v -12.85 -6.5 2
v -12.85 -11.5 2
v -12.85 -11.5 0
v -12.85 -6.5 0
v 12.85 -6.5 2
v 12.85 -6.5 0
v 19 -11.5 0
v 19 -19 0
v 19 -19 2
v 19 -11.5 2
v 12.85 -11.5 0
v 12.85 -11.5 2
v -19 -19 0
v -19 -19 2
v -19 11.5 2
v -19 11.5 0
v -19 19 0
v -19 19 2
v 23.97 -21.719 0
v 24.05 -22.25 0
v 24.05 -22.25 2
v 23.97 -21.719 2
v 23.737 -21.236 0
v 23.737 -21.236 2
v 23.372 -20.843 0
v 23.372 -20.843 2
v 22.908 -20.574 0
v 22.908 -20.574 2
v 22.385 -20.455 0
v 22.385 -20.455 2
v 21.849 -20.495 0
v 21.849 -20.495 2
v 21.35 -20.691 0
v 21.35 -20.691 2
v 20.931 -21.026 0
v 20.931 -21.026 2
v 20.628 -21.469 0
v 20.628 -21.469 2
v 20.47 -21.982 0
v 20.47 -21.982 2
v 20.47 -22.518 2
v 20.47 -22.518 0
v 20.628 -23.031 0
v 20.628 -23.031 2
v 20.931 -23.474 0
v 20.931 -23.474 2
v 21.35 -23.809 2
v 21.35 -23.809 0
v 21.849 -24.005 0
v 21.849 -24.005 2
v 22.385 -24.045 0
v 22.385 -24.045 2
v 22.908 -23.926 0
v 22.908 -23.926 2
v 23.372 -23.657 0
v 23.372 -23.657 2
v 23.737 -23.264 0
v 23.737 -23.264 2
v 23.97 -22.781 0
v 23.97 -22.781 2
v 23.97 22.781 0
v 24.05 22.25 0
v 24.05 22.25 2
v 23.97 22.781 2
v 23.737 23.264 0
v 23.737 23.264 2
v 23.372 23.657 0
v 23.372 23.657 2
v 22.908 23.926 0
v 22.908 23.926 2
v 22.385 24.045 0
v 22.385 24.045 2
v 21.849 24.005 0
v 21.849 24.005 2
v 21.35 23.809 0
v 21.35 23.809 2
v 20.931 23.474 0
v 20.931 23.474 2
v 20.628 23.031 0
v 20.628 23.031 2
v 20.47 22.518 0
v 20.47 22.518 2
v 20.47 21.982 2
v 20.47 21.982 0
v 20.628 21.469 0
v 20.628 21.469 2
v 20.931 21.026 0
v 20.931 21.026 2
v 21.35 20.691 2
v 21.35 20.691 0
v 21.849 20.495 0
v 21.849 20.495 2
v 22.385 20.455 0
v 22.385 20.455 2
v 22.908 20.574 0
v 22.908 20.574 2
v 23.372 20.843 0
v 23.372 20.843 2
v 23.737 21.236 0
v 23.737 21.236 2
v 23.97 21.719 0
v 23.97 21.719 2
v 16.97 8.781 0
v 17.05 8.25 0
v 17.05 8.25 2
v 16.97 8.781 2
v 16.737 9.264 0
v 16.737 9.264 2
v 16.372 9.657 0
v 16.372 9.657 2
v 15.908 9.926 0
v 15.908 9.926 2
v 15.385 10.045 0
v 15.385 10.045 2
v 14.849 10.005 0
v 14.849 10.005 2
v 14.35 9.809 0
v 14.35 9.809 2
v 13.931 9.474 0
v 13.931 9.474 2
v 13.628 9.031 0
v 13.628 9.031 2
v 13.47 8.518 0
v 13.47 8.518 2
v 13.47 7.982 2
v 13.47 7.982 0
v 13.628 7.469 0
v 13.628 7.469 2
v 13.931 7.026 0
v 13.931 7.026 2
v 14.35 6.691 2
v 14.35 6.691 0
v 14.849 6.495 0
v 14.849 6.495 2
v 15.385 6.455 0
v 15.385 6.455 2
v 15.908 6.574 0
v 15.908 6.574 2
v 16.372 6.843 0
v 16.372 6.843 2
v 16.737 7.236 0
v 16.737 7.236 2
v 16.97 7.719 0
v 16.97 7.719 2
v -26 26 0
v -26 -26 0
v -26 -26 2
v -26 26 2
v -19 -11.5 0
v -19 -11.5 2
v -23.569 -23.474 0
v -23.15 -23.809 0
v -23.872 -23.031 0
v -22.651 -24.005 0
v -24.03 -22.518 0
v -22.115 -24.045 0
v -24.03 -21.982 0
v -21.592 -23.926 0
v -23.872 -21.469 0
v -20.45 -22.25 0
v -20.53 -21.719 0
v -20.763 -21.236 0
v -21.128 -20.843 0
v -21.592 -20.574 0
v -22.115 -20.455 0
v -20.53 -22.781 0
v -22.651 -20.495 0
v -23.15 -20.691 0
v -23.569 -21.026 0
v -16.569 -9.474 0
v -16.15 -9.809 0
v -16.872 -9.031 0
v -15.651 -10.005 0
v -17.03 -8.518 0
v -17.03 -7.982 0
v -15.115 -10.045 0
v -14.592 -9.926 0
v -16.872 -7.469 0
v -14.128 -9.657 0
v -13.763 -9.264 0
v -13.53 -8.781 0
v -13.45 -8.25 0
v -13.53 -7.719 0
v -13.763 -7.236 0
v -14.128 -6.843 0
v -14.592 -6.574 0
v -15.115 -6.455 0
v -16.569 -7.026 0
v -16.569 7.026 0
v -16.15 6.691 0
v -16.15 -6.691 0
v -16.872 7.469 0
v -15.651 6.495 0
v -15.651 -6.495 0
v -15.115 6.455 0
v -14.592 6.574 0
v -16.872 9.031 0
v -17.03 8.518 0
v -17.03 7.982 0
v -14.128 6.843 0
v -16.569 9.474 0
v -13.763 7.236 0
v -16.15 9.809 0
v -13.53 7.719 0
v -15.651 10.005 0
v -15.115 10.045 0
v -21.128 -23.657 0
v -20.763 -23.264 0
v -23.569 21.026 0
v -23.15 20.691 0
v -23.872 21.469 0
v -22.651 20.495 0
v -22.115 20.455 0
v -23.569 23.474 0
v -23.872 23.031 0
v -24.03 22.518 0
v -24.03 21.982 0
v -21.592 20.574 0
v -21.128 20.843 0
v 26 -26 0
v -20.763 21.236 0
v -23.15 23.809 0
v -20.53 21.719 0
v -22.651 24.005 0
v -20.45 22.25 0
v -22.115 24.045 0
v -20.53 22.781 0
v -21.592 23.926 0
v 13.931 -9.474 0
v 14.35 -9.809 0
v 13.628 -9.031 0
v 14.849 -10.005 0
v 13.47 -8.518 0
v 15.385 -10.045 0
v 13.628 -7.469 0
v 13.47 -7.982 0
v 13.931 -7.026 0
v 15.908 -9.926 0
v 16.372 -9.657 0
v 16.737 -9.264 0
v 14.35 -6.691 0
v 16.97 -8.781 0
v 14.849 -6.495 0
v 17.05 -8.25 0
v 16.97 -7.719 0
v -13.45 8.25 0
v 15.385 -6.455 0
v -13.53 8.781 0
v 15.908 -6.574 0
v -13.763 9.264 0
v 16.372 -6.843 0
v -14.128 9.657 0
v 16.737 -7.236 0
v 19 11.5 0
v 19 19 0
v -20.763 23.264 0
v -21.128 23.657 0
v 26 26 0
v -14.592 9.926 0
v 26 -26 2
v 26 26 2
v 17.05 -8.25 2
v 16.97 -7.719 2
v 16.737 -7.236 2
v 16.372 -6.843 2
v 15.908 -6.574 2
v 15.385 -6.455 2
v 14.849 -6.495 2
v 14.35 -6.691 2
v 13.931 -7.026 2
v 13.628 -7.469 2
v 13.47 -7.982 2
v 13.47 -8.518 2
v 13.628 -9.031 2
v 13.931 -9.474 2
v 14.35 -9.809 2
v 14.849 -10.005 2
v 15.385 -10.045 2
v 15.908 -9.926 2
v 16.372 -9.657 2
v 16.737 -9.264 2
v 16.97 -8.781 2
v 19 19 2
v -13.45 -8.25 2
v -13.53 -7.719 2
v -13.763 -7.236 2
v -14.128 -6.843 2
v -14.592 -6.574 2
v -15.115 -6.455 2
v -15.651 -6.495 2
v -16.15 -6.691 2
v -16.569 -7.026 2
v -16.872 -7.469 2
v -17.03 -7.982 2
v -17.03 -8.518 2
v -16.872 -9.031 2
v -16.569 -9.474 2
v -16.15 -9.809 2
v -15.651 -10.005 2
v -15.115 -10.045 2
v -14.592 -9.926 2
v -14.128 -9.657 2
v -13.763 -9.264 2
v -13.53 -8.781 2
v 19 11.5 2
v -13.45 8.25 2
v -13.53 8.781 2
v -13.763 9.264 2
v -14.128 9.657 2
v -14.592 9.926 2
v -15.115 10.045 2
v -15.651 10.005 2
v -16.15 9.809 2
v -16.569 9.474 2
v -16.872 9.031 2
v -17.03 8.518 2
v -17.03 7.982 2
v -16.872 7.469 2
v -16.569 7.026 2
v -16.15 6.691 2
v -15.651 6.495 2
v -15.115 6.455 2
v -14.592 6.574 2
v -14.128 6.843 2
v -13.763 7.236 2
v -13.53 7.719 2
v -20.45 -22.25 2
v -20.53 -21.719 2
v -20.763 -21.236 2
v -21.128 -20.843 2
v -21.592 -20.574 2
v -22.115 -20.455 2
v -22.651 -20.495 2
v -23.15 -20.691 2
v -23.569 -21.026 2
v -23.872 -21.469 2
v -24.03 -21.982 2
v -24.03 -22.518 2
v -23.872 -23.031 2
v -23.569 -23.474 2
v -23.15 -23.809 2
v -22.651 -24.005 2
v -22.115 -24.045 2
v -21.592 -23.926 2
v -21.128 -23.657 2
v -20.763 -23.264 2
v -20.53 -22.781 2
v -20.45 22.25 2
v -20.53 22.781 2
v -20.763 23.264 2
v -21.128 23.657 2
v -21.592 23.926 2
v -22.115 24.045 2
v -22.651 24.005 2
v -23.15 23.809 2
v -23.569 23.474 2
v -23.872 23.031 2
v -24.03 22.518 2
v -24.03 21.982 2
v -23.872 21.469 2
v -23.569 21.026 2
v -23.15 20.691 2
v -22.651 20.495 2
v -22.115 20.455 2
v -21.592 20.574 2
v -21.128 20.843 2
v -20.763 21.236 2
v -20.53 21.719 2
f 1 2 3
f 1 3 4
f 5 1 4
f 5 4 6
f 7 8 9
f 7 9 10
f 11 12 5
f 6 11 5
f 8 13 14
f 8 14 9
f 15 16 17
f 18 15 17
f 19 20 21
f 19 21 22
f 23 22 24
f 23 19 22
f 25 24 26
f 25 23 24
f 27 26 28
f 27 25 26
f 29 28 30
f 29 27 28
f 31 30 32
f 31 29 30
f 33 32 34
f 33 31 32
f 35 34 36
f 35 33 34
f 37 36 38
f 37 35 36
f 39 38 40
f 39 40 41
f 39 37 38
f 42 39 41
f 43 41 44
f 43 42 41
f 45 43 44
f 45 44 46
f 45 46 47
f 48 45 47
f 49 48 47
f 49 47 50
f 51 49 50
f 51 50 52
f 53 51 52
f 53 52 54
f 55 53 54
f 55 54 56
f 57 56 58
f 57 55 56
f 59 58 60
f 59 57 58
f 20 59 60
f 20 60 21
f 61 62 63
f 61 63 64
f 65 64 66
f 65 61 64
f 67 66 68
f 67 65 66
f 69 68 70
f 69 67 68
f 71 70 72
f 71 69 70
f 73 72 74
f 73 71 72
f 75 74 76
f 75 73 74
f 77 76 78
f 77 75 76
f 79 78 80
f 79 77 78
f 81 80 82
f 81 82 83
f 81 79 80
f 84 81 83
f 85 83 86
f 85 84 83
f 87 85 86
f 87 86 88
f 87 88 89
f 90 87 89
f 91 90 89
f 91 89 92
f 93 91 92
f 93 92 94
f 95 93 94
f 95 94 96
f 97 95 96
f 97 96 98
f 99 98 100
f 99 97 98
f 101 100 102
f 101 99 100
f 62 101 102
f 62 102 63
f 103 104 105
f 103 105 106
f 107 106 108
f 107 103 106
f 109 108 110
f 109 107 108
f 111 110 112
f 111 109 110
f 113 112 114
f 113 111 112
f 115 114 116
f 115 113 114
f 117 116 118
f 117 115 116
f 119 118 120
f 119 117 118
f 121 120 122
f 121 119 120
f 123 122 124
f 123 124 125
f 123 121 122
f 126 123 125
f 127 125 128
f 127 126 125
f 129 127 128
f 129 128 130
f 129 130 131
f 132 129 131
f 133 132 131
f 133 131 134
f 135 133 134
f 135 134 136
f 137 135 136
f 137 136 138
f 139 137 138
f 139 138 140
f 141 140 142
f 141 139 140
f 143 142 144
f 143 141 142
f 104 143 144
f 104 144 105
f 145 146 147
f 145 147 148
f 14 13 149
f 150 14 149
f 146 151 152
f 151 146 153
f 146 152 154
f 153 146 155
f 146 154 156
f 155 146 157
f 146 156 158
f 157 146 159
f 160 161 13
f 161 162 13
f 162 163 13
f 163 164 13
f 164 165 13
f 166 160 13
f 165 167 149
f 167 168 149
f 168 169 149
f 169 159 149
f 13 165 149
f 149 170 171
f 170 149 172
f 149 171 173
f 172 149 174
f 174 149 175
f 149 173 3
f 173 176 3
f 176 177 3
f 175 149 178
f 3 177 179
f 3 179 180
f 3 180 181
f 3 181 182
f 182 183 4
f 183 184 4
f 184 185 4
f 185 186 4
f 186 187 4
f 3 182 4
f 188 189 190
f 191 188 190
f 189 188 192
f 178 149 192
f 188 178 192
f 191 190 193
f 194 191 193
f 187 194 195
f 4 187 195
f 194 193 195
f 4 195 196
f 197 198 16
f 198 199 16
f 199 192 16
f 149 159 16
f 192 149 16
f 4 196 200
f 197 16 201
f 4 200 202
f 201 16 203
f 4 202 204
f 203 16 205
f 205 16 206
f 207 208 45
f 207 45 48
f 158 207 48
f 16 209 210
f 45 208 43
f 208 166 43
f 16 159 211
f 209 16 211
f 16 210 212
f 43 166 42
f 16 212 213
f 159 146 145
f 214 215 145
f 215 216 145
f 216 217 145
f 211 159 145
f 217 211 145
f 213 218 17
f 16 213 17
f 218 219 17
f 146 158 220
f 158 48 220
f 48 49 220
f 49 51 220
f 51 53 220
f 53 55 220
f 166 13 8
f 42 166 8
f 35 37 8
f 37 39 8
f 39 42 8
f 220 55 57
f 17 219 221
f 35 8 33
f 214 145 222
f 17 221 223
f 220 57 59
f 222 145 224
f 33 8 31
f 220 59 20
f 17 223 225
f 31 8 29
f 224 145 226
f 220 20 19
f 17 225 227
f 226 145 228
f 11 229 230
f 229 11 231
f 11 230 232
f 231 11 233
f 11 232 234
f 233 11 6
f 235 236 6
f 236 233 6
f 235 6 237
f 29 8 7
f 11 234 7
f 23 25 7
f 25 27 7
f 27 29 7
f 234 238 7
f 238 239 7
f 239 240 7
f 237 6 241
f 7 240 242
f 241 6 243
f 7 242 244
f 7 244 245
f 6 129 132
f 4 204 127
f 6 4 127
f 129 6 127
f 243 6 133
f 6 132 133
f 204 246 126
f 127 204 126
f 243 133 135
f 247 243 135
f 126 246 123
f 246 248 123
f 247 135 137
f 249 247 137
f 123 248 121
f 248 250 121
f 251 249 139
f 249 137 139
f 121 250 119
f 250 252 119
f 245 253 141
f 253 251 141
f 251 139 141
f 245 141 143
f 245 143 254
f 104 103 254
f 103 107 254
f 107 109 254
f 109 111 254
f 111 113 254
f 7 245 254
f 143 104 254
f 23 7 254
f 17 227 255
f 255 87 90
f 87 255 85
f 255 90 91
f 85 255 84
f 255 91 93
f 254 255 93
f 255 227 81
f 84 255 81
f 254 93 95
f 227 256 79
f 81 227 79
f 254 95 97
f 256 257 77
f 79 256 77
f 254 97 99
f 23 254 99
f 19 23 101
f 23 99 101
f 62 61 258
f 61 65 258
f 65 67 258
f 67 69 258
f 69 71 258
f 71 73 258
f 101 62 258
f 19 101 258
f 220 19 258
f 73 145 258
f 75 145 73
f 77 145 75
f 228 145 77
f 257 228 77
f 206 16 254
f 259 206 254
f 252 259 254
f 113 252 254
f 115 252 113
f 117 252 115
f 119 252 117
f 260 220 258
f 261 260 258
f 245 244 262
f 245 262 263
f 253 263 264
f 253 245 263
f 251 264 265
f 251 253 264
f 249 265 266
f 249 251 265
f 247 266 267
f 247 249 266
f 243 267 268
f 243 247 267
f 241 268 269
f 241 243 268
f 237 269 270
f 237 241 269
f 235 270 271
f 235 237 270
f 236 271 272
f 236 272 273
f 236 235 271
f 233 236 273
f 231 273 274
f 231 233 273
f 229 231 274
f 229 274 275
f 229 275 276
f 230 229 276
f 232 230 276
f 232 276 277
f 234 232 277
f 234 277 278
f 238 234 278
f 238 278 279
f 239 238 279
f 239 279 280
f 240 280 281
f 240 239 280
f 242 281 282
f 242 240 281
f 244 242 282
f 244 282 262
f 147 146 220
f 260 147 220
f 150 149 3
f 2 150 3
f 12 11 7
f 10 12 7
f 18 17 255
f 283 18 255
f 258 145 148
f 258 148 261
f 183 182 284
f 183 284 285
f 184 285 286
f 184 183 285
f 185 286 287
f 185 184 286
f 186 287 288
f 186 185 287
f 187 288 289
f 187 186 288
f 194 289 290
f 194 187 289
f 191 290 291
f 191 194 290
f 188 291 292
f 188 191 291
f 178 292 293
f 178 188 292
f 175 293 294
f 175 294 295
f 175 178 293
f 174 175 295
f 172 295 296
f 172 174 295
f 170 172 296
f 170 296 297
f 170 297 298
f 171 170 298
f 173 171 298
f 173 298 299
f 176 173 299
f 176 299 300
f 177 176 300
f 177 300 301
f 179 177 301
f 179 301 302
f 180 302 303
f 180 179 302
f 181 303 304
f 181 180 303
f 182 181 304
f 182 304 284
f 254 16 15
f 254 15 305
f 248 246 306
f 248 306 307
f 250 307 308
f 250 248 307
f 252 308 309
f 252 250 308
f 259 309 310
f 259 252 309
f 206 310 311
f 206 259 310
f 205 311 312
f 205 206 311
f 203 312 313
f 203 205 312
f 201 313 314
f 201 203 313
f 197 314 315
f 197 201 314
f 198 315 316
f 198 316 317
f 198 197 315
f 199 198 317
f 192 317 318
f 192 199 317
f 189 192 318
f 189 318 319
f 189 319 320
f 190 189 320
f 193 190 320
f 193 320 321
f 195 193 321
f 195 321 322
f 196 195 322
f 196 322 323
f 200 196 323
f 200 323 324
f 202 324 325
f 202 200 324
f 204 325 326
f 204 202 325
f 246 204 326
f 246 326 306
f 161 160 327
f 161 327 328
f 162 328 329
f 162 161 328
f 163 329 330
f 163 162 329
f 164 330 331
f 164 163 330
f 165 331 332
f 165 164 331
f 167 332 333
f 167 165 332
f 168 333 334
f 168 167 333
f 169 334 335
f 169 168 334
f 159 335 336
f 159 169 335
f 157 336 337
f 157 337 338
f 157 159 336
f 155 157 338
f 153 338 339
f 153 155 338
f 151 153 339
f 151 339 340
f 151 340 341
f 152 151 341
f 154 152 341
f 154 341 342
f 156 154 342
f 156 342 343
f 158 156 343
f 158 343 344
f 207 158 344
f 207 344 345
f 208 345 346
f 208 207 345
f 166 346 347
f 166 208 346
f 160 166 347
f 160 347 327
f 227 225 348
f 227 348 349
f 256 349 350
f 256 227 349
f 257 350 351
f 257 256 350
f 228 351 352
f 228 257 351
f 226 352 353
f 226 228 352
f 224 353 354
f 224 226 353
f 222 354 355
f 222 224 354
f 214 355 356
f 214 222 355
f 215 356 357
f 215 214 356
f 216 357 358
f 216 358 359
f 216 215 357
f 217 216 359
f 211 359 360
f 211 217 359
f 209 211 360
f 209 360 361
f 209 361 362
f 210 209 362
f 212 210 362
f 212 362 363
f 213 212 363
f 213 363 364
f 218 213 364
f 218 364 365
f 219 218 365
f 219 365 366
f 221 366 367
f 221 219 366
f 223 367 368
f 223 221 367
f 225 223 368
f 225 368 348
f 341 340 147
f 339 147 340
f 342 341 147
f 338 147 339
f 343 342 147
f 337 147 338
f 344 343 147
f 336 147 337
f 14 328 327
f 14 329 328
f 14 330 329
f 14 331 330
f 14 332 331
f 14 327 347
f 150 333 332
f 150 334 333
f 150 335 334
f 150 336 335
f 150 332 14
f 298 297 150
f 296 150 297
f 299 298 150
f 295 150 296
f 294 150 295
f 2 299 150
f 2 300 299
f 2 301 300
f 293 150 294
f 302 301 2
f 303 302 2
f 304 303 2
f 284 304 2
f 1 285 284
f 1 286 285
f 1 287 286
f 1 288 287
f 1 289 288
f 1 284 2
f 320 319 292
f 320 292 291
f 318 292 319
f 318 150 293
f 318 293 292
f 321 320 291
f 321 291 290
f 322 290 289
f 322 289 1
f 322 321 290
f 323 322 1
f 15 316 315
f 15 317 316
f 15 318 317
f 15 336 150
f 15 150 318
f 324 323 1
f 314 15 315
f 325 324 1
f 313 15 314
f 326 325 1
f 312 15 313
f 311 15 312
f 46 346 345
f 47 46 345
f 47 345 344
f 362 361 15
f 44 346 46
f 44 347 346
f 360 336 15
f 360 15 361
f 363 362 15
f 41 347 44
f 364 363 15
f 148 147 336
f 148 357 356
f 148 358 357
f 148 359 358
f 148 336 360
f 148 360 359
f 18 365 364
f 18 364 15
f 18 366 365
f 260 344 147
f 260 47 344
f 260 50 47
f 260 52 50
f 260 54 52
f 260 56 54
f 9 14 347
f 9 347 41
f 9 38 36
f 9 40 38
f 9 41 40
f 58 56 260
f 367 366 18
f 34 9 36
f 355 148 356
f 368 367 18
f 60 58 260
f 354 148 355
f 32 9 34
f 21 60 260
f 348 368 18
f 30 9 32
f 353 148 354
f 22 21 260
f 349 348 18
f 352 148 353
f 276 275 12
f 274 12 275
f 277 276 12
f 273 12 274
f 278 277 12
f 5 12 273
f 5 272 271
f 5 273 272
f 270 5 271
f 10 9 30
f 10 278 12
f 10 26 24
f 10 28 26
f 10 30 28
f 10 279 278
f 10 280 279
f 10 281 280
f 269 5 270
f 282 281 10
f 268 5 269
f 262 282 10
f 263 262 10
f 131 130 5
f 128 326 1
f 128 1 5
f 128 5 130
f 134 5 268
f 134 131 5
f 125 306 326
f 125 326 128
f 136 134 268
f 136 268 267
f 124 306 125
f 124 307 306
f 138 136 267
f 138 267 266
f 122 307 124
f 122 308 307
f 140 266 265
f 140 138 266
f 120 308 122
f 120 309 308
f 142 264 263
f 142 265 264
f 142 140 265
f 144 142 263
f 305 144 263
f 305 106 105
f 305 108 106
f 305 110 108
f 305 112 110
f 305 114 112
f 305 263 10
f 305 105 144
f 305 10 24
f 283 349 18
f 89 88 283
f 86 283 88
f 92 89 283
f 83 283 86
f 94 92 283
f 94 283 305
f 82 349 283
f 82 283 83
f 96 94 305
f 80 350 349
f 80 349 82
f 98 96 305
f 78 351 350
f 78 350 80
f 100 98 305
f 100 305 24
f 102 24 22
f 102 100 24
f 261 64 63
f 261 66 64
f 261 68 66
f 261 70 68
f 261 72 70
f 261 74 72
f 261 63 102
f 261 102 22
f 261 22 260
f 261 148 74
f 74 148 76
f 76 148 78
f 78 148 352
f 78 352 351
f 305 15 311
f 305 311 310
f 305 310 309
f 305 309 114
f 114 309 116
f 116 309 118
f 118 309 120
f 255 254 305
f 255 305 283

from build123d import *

# Parameters (mm, degrees)
SKETCH_W     = 52
SKETCH_H     = 52
SKETCH_R     = 1.8
SKETCH_W_2   = 38
SKETCH_H_2   = 7.5
PAD_DEPTH    = 2
SKETCH001_W  = 25.7
SKETCH001_H  = 8
POCKET_DEPTH = 5


with BuildPart() as part:
    # Sketch → Pad (new body)
    with BuildSketch(Plane.XY):
        Rectangle(SKETCH_W, SKETCH_H)
        with Locations((22.25, 22.25)):
            Circle(SKETCH_R, mode=Mode.SUBTRACT)
        with Locations((22.25, -22.25)):
            Circle(SKETCH_R, mode=Mode.SUBTRACT)
        with Locations((-22.25, 22.25)):
            Circle(SKETCH_R, mode=Mode.SUBTRACT)
        with Locations((-22.25, -22.25)):
            Circle(SKETCH_R, mode=Mode.SUBTRACT)
        with Locations((15.25, 8.25)):
            Circle(SKETCH_R, mode=Mode.SUBTRACT)
        with Locations((-15.25, 8.25)):
            Circle(SKETCH_R, mode=Mode.SUBTRACT)
        with Locations((-15.25, -8.25)):
            Circle(SKETCH_R, mode=Mode.SUBTRACT)
        with Locations((15.25, -8.25)):
            Circle(SKETCH_R, mode=Mode.SUBTRACT)
        with Locations((0, 15.25)):
            Rectangle(SKETCH_W_2, SKETCH_H_2, mode=Mode.SUBTRACT)
        with Locations((0, -15.25)):
            Rectangle(SKETCH_W_2, SKETCH_H_2, mode=Mode.SUBTRACT)
    extrude(amount=PAD_DEPTH)

    # Sketch001 → Pocket (cut)
    with BuildSketch(Plane.XY.offset(2)):
        with Locations((0, -10.5)):
            Rectangle(SKETCH001_W, SKETCH001_H)
    extrude(amount=-POCKET_DEPTH, mode=Mode.SUBTRACT)


solid = part.part
